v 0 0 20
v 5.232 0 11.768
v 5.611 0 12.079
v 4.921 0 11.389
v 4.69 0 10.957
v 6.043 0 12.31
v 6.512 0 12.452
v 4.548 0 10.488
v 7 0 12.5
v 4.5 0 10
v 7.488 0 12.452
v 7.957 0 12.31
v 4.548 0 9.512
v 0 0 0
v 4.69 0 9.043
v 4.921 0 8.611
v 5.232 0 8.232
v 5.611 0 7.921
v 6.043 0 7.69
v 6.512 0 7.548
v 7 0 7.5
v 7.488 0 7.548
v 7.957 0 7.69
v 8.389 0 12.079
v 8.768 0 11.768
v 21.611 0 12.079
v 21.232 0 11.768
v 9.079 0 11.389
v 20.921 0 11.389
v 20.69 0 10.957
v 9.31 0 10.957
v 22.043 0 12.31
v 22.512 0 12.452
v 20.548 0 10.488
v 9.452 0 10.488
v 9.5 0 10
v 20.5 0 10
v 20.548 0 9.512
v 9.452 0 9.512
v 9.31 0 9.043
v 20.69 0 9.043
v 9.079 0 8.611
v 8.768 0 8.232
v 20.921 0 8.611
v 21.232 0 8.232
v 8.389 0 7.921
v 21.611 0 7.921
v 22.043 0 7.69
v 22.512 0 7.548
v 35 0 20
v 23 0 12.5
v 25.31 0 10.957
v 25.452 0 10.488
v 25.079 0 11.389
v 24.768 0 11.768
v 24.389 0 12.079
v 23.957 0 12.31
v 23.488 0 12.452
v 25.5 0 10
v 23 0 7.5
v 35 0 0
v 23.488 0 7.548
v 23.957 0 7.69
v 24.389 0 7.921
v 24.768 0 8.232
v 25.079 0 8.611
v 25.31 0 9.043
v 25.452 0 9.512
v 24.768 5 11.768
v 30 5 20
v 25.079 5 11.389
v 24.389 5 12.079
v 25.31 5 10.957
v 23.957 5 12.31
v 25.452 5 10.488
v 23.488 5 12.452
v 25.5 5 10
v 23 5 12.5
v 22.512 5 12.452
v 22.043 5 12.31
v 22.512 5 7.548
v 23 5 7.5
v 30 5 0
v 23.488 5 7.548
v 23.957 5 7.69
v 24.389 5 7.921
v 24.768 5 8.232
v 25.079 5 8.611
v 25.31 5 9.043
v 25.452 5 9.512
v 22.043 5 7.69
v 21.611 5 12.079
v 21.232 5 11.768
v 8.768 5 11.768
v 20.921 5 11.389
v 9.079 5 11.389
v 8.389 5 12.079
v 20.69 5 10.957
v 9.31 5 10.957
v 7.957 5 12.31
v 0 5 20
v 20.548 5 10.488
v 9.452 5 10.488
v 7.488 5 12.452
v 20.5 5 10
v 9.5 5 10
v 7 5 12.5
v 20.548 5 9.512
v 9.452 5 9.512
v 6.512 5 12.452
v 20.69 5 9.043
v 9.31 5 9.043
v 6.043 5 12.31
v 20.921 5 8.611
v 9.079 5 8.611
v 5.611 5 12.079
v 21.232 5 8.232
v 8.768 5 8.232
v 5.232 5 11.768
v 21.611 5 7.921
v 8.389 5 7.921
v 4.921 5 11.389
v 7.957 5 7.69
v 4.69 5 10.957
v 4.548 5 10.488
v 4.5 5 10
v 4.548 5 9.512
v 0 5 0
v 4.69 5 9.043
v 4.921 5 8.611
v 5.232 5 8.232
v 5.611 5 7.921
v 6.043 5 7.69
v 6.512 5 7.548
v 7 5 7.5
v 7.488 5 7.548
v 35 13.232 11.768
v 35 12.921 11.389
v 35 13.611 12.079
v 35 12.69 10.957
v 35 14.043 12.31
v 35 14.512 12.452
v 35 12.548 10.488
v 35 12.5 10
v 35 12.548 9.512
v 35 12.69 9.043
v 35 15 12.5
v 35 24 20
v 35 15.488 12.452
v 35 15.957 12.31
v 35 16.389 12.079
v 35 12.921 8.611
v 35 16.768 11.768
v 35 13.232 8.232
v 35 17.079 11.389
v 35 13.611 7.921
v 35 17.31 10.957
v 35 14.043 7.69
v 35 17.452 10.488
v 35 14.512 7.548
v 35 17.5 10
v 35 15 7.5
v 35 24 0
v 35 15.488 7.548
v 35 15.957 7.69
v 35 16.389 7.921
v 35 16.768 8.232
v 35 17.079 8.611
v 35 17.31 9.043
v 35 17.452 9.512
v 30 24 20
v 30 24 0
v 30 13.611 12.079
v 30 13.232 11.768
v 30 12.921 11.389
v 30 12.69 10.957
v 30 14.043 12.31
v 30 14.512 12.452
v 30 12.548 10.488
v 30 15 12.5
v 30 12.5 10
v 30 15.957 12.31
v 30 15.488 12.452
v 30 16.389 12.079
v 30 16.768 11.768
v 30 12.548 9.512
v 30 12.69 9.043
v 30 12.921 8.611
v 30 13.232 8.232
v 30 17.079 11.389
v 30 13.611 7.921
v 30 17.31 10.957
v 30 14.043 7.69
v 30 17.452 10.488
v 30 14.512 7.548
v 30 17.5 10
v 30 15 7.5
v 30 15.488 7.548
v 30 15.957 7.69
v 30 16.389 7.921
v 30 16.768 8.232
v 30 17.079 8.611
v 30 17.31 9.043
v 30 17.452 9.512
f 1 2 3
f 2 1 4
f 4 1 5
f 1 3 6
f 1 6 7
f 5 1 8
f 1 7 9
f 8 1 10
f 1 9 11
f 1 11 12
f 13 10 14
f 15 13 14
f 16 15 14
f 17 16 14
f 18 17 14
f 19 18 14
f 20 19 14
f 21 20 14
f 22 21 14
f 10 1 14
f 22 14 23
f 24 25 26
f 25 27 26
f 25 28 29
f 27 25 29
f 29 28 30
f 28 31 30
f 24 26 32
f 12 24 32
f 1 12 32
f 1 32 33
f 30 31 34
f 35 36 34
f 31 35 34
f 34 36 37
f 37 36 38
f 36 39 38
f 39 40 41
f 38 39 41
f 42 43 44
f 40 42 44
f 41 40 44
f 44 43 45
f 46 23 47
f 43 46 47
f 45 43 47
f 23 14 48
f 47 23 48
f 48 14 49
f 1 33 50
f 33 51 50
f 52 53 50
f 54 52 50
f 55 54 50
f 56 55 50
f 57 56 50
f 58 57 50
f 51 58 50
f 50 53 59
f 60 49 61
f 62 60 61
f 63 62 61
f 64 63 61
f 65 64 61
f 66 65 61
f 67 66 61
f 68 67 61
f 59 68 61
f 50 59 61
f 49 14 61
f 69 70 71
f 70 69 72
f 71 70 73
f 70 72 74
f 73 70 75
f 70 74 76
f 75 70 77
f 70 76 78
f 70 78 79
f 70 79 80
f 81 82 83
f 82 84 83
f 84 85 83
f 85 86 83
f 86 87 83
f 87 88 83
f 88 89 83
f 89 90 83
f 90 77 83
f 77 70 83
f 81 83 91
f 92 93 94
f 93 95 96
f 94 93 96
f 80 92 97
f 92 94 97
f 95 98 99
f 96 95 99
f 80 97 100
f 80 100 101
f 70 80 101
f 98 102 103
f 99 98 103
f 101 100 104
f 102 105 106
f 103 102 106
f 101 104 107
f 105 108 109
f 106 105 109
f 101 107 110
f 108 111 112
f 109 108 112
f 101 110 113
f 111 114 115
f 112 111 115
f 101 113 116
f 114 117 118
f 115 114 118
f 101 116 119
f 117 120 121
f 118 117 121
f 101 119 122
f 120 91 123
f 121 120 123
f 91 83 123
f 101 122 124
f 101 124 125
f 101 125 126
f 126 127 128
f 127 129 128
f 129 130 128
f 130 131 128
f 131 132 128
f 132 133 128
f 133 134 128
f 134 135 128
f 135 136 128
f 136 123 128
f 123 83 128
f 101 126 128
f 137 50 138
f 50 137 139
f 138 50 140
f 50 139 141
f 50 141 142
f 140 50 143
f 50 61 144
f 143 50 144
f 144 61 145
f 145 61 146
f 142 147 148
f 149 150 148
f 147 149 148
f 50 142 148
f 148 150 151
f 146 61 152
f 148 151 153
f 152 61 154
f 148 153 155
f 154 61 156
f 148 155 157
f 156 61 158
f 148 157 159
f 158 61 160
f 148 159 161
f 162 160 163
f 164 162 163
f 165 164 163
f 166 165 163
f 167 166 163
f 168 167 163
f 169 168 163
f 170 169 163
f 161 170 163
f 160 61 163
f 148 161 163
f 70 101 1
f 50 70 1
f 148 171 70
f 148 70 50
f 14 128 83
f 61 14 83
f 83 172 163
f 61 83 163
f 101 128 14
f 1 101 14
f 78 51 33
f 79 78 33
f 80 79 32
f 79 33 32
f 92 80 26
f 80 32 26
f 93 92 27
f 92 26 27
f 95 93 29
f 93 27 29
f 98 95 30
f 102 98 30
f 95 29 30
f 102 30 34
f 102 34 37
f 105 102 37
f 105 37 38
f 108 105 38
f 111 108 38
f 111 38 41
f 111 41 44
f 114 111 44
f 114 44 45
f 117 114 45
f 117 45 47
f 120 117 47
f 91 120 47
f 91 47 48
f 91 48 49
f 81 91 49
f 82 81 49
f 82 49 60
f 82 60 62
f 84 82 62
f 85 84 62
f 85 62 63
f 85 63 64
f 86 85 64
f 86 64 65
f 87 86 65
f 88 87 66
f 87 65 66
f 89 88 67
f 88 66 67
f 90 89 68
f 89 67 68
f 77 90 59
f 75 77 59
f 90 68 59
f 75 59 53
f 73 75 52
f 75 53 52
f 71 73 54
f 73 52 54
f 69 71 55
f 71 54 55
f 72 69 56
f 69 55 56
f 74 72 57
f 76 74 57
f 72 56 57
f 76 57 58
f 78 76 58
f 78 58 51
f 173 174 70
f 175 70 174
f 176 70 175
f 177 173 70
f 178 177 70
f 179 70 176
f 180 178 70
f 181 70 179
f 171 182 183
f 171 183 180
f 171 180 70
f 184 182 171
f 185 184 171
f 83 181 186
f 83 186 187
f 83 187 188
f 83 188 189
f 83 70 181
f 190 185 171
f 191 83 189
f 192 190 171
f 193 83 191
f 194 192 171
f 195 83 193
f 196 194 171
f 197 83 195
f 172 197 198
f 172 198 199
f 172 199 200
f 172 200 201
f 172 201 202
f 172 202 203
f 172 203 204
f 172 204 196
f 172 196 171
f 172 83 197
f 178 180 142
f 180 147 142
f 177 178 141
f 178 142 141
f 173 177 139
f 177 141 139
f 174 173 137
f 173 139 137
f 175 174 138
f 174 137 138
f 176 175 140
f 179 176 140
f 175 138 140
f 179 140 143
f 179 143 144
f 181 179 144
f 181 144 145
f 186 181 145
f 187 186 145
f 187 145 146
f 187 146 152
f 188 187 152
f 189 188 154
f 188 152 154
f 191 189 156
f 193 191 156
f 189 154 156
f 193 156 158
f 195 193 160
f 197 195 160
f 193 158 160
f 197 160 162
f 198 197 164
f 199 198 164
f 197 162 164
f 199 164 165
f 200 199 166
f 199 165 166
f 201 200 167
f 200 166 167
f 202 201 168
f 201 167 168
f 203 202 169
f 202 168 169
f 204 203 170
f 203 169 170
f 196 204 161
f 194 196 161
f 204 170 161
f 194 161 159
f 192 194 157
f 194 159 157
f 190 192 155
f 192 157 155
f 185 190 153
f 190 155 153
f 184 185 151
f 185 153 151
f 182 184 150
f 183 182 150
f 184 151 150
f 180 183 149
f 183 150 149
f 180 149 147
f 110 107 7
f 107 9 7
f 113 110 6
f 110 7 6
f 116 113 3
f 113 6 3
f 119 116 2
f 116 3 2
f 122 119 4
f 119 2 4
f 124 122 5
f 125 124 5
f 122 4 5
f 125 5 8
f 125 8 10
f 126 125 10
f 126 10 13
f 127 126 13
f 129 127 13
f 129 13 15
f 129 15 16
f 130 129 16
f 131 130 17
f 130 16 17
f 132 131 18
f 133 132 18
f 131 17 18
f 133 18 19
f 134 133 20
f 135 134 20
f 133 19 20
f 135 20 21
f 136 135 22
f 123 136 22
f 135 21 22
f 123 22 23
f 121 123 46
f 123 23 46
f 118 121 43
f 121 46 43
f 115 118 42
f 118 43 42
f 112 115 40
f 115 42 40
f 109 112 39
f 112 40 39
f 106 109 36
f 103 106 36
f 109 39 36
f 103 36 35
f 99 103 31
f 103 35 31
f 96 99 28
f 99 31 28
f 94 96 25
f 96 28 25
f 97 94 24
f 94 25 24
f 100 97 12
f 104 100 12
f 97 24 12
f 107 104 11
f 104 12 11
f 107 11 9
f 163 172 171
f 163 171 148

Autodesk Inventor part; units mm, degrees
ref_plane "YZ Plane" through (0, 0, 0) normal (1, 0, 0) x (0, 1, 0)
ref_plane "XZ Plane" through (0, 0, 0) normal (0, 1, 0) x (-1, 0, 0)
ref_plane "XY Plane" through (0, 0, 0) normal (0, 0, 1) x (1, 0, 0)
sketch "Sketch1" plane through (0, 0, 0) normal (0, 0, 1) x (1, 0, 0)
  line L0 (0, 0) -> (35, 0)
  line L1 (35, 0) -> (35, 5)
  line L2 (35, 5) -> (0, 5)
  line L3 (0, 5) -> (0, 0)
  line L4 (35, 5) -> (30, 5)
  line L5 (30, 5) -> (30, 24)
  line L6 (30, 24) -> (35, 24)
  line L7 (35, 24) -> (35, 5)
  dimension "d0" = 5
  dimension "d1" = 5
  dimension "d2" = 35
  dimension "d3" = 19
extrude "Extrusion1" add sketch "Sketch1" along normal blind 20
sketch "Sketch2" plane through (0, 5, 0) normal (0, 1, 0) x (1, 0, 0)
  line L0 (0, 0) -> (35, 0) projected
  line L1 (0, 0) -> (0, -20) projected
  line L2 (30, 0) -> (30, -20) projected
  point P0 (7, -10)
  point P1 (23, -10)
  dimension "d6" = 10
  dimension "d7" = 7
  dimension "d8" = 7
hole "Hole1" at (7, 5, 10) at (23, 5, 10) direction (0, -1, 0) diameter 5 depth 8 tip angle 118
sketch "Sketch3" plane through (30, 5, 0) normal (-1, 0, 0) x (0, 0, 1)
  line L0 (0, 19) -> (20, 19) projected
  line L1 (0, -5) -> (0, 19) projected
  line L2 (7.5, 0) -> (12.5, 0) projected
  line L3 (20, 19) -> (20, 0) projected
  point P0 (10, 10)
  dimension "d18" = 10
  dimension "d19" = 10
hole "Hole2" at (30, 15, 10) direction (1, 0, 0) diameter 5 depth 8 tip angle 118
properties part number "corner bracket"
